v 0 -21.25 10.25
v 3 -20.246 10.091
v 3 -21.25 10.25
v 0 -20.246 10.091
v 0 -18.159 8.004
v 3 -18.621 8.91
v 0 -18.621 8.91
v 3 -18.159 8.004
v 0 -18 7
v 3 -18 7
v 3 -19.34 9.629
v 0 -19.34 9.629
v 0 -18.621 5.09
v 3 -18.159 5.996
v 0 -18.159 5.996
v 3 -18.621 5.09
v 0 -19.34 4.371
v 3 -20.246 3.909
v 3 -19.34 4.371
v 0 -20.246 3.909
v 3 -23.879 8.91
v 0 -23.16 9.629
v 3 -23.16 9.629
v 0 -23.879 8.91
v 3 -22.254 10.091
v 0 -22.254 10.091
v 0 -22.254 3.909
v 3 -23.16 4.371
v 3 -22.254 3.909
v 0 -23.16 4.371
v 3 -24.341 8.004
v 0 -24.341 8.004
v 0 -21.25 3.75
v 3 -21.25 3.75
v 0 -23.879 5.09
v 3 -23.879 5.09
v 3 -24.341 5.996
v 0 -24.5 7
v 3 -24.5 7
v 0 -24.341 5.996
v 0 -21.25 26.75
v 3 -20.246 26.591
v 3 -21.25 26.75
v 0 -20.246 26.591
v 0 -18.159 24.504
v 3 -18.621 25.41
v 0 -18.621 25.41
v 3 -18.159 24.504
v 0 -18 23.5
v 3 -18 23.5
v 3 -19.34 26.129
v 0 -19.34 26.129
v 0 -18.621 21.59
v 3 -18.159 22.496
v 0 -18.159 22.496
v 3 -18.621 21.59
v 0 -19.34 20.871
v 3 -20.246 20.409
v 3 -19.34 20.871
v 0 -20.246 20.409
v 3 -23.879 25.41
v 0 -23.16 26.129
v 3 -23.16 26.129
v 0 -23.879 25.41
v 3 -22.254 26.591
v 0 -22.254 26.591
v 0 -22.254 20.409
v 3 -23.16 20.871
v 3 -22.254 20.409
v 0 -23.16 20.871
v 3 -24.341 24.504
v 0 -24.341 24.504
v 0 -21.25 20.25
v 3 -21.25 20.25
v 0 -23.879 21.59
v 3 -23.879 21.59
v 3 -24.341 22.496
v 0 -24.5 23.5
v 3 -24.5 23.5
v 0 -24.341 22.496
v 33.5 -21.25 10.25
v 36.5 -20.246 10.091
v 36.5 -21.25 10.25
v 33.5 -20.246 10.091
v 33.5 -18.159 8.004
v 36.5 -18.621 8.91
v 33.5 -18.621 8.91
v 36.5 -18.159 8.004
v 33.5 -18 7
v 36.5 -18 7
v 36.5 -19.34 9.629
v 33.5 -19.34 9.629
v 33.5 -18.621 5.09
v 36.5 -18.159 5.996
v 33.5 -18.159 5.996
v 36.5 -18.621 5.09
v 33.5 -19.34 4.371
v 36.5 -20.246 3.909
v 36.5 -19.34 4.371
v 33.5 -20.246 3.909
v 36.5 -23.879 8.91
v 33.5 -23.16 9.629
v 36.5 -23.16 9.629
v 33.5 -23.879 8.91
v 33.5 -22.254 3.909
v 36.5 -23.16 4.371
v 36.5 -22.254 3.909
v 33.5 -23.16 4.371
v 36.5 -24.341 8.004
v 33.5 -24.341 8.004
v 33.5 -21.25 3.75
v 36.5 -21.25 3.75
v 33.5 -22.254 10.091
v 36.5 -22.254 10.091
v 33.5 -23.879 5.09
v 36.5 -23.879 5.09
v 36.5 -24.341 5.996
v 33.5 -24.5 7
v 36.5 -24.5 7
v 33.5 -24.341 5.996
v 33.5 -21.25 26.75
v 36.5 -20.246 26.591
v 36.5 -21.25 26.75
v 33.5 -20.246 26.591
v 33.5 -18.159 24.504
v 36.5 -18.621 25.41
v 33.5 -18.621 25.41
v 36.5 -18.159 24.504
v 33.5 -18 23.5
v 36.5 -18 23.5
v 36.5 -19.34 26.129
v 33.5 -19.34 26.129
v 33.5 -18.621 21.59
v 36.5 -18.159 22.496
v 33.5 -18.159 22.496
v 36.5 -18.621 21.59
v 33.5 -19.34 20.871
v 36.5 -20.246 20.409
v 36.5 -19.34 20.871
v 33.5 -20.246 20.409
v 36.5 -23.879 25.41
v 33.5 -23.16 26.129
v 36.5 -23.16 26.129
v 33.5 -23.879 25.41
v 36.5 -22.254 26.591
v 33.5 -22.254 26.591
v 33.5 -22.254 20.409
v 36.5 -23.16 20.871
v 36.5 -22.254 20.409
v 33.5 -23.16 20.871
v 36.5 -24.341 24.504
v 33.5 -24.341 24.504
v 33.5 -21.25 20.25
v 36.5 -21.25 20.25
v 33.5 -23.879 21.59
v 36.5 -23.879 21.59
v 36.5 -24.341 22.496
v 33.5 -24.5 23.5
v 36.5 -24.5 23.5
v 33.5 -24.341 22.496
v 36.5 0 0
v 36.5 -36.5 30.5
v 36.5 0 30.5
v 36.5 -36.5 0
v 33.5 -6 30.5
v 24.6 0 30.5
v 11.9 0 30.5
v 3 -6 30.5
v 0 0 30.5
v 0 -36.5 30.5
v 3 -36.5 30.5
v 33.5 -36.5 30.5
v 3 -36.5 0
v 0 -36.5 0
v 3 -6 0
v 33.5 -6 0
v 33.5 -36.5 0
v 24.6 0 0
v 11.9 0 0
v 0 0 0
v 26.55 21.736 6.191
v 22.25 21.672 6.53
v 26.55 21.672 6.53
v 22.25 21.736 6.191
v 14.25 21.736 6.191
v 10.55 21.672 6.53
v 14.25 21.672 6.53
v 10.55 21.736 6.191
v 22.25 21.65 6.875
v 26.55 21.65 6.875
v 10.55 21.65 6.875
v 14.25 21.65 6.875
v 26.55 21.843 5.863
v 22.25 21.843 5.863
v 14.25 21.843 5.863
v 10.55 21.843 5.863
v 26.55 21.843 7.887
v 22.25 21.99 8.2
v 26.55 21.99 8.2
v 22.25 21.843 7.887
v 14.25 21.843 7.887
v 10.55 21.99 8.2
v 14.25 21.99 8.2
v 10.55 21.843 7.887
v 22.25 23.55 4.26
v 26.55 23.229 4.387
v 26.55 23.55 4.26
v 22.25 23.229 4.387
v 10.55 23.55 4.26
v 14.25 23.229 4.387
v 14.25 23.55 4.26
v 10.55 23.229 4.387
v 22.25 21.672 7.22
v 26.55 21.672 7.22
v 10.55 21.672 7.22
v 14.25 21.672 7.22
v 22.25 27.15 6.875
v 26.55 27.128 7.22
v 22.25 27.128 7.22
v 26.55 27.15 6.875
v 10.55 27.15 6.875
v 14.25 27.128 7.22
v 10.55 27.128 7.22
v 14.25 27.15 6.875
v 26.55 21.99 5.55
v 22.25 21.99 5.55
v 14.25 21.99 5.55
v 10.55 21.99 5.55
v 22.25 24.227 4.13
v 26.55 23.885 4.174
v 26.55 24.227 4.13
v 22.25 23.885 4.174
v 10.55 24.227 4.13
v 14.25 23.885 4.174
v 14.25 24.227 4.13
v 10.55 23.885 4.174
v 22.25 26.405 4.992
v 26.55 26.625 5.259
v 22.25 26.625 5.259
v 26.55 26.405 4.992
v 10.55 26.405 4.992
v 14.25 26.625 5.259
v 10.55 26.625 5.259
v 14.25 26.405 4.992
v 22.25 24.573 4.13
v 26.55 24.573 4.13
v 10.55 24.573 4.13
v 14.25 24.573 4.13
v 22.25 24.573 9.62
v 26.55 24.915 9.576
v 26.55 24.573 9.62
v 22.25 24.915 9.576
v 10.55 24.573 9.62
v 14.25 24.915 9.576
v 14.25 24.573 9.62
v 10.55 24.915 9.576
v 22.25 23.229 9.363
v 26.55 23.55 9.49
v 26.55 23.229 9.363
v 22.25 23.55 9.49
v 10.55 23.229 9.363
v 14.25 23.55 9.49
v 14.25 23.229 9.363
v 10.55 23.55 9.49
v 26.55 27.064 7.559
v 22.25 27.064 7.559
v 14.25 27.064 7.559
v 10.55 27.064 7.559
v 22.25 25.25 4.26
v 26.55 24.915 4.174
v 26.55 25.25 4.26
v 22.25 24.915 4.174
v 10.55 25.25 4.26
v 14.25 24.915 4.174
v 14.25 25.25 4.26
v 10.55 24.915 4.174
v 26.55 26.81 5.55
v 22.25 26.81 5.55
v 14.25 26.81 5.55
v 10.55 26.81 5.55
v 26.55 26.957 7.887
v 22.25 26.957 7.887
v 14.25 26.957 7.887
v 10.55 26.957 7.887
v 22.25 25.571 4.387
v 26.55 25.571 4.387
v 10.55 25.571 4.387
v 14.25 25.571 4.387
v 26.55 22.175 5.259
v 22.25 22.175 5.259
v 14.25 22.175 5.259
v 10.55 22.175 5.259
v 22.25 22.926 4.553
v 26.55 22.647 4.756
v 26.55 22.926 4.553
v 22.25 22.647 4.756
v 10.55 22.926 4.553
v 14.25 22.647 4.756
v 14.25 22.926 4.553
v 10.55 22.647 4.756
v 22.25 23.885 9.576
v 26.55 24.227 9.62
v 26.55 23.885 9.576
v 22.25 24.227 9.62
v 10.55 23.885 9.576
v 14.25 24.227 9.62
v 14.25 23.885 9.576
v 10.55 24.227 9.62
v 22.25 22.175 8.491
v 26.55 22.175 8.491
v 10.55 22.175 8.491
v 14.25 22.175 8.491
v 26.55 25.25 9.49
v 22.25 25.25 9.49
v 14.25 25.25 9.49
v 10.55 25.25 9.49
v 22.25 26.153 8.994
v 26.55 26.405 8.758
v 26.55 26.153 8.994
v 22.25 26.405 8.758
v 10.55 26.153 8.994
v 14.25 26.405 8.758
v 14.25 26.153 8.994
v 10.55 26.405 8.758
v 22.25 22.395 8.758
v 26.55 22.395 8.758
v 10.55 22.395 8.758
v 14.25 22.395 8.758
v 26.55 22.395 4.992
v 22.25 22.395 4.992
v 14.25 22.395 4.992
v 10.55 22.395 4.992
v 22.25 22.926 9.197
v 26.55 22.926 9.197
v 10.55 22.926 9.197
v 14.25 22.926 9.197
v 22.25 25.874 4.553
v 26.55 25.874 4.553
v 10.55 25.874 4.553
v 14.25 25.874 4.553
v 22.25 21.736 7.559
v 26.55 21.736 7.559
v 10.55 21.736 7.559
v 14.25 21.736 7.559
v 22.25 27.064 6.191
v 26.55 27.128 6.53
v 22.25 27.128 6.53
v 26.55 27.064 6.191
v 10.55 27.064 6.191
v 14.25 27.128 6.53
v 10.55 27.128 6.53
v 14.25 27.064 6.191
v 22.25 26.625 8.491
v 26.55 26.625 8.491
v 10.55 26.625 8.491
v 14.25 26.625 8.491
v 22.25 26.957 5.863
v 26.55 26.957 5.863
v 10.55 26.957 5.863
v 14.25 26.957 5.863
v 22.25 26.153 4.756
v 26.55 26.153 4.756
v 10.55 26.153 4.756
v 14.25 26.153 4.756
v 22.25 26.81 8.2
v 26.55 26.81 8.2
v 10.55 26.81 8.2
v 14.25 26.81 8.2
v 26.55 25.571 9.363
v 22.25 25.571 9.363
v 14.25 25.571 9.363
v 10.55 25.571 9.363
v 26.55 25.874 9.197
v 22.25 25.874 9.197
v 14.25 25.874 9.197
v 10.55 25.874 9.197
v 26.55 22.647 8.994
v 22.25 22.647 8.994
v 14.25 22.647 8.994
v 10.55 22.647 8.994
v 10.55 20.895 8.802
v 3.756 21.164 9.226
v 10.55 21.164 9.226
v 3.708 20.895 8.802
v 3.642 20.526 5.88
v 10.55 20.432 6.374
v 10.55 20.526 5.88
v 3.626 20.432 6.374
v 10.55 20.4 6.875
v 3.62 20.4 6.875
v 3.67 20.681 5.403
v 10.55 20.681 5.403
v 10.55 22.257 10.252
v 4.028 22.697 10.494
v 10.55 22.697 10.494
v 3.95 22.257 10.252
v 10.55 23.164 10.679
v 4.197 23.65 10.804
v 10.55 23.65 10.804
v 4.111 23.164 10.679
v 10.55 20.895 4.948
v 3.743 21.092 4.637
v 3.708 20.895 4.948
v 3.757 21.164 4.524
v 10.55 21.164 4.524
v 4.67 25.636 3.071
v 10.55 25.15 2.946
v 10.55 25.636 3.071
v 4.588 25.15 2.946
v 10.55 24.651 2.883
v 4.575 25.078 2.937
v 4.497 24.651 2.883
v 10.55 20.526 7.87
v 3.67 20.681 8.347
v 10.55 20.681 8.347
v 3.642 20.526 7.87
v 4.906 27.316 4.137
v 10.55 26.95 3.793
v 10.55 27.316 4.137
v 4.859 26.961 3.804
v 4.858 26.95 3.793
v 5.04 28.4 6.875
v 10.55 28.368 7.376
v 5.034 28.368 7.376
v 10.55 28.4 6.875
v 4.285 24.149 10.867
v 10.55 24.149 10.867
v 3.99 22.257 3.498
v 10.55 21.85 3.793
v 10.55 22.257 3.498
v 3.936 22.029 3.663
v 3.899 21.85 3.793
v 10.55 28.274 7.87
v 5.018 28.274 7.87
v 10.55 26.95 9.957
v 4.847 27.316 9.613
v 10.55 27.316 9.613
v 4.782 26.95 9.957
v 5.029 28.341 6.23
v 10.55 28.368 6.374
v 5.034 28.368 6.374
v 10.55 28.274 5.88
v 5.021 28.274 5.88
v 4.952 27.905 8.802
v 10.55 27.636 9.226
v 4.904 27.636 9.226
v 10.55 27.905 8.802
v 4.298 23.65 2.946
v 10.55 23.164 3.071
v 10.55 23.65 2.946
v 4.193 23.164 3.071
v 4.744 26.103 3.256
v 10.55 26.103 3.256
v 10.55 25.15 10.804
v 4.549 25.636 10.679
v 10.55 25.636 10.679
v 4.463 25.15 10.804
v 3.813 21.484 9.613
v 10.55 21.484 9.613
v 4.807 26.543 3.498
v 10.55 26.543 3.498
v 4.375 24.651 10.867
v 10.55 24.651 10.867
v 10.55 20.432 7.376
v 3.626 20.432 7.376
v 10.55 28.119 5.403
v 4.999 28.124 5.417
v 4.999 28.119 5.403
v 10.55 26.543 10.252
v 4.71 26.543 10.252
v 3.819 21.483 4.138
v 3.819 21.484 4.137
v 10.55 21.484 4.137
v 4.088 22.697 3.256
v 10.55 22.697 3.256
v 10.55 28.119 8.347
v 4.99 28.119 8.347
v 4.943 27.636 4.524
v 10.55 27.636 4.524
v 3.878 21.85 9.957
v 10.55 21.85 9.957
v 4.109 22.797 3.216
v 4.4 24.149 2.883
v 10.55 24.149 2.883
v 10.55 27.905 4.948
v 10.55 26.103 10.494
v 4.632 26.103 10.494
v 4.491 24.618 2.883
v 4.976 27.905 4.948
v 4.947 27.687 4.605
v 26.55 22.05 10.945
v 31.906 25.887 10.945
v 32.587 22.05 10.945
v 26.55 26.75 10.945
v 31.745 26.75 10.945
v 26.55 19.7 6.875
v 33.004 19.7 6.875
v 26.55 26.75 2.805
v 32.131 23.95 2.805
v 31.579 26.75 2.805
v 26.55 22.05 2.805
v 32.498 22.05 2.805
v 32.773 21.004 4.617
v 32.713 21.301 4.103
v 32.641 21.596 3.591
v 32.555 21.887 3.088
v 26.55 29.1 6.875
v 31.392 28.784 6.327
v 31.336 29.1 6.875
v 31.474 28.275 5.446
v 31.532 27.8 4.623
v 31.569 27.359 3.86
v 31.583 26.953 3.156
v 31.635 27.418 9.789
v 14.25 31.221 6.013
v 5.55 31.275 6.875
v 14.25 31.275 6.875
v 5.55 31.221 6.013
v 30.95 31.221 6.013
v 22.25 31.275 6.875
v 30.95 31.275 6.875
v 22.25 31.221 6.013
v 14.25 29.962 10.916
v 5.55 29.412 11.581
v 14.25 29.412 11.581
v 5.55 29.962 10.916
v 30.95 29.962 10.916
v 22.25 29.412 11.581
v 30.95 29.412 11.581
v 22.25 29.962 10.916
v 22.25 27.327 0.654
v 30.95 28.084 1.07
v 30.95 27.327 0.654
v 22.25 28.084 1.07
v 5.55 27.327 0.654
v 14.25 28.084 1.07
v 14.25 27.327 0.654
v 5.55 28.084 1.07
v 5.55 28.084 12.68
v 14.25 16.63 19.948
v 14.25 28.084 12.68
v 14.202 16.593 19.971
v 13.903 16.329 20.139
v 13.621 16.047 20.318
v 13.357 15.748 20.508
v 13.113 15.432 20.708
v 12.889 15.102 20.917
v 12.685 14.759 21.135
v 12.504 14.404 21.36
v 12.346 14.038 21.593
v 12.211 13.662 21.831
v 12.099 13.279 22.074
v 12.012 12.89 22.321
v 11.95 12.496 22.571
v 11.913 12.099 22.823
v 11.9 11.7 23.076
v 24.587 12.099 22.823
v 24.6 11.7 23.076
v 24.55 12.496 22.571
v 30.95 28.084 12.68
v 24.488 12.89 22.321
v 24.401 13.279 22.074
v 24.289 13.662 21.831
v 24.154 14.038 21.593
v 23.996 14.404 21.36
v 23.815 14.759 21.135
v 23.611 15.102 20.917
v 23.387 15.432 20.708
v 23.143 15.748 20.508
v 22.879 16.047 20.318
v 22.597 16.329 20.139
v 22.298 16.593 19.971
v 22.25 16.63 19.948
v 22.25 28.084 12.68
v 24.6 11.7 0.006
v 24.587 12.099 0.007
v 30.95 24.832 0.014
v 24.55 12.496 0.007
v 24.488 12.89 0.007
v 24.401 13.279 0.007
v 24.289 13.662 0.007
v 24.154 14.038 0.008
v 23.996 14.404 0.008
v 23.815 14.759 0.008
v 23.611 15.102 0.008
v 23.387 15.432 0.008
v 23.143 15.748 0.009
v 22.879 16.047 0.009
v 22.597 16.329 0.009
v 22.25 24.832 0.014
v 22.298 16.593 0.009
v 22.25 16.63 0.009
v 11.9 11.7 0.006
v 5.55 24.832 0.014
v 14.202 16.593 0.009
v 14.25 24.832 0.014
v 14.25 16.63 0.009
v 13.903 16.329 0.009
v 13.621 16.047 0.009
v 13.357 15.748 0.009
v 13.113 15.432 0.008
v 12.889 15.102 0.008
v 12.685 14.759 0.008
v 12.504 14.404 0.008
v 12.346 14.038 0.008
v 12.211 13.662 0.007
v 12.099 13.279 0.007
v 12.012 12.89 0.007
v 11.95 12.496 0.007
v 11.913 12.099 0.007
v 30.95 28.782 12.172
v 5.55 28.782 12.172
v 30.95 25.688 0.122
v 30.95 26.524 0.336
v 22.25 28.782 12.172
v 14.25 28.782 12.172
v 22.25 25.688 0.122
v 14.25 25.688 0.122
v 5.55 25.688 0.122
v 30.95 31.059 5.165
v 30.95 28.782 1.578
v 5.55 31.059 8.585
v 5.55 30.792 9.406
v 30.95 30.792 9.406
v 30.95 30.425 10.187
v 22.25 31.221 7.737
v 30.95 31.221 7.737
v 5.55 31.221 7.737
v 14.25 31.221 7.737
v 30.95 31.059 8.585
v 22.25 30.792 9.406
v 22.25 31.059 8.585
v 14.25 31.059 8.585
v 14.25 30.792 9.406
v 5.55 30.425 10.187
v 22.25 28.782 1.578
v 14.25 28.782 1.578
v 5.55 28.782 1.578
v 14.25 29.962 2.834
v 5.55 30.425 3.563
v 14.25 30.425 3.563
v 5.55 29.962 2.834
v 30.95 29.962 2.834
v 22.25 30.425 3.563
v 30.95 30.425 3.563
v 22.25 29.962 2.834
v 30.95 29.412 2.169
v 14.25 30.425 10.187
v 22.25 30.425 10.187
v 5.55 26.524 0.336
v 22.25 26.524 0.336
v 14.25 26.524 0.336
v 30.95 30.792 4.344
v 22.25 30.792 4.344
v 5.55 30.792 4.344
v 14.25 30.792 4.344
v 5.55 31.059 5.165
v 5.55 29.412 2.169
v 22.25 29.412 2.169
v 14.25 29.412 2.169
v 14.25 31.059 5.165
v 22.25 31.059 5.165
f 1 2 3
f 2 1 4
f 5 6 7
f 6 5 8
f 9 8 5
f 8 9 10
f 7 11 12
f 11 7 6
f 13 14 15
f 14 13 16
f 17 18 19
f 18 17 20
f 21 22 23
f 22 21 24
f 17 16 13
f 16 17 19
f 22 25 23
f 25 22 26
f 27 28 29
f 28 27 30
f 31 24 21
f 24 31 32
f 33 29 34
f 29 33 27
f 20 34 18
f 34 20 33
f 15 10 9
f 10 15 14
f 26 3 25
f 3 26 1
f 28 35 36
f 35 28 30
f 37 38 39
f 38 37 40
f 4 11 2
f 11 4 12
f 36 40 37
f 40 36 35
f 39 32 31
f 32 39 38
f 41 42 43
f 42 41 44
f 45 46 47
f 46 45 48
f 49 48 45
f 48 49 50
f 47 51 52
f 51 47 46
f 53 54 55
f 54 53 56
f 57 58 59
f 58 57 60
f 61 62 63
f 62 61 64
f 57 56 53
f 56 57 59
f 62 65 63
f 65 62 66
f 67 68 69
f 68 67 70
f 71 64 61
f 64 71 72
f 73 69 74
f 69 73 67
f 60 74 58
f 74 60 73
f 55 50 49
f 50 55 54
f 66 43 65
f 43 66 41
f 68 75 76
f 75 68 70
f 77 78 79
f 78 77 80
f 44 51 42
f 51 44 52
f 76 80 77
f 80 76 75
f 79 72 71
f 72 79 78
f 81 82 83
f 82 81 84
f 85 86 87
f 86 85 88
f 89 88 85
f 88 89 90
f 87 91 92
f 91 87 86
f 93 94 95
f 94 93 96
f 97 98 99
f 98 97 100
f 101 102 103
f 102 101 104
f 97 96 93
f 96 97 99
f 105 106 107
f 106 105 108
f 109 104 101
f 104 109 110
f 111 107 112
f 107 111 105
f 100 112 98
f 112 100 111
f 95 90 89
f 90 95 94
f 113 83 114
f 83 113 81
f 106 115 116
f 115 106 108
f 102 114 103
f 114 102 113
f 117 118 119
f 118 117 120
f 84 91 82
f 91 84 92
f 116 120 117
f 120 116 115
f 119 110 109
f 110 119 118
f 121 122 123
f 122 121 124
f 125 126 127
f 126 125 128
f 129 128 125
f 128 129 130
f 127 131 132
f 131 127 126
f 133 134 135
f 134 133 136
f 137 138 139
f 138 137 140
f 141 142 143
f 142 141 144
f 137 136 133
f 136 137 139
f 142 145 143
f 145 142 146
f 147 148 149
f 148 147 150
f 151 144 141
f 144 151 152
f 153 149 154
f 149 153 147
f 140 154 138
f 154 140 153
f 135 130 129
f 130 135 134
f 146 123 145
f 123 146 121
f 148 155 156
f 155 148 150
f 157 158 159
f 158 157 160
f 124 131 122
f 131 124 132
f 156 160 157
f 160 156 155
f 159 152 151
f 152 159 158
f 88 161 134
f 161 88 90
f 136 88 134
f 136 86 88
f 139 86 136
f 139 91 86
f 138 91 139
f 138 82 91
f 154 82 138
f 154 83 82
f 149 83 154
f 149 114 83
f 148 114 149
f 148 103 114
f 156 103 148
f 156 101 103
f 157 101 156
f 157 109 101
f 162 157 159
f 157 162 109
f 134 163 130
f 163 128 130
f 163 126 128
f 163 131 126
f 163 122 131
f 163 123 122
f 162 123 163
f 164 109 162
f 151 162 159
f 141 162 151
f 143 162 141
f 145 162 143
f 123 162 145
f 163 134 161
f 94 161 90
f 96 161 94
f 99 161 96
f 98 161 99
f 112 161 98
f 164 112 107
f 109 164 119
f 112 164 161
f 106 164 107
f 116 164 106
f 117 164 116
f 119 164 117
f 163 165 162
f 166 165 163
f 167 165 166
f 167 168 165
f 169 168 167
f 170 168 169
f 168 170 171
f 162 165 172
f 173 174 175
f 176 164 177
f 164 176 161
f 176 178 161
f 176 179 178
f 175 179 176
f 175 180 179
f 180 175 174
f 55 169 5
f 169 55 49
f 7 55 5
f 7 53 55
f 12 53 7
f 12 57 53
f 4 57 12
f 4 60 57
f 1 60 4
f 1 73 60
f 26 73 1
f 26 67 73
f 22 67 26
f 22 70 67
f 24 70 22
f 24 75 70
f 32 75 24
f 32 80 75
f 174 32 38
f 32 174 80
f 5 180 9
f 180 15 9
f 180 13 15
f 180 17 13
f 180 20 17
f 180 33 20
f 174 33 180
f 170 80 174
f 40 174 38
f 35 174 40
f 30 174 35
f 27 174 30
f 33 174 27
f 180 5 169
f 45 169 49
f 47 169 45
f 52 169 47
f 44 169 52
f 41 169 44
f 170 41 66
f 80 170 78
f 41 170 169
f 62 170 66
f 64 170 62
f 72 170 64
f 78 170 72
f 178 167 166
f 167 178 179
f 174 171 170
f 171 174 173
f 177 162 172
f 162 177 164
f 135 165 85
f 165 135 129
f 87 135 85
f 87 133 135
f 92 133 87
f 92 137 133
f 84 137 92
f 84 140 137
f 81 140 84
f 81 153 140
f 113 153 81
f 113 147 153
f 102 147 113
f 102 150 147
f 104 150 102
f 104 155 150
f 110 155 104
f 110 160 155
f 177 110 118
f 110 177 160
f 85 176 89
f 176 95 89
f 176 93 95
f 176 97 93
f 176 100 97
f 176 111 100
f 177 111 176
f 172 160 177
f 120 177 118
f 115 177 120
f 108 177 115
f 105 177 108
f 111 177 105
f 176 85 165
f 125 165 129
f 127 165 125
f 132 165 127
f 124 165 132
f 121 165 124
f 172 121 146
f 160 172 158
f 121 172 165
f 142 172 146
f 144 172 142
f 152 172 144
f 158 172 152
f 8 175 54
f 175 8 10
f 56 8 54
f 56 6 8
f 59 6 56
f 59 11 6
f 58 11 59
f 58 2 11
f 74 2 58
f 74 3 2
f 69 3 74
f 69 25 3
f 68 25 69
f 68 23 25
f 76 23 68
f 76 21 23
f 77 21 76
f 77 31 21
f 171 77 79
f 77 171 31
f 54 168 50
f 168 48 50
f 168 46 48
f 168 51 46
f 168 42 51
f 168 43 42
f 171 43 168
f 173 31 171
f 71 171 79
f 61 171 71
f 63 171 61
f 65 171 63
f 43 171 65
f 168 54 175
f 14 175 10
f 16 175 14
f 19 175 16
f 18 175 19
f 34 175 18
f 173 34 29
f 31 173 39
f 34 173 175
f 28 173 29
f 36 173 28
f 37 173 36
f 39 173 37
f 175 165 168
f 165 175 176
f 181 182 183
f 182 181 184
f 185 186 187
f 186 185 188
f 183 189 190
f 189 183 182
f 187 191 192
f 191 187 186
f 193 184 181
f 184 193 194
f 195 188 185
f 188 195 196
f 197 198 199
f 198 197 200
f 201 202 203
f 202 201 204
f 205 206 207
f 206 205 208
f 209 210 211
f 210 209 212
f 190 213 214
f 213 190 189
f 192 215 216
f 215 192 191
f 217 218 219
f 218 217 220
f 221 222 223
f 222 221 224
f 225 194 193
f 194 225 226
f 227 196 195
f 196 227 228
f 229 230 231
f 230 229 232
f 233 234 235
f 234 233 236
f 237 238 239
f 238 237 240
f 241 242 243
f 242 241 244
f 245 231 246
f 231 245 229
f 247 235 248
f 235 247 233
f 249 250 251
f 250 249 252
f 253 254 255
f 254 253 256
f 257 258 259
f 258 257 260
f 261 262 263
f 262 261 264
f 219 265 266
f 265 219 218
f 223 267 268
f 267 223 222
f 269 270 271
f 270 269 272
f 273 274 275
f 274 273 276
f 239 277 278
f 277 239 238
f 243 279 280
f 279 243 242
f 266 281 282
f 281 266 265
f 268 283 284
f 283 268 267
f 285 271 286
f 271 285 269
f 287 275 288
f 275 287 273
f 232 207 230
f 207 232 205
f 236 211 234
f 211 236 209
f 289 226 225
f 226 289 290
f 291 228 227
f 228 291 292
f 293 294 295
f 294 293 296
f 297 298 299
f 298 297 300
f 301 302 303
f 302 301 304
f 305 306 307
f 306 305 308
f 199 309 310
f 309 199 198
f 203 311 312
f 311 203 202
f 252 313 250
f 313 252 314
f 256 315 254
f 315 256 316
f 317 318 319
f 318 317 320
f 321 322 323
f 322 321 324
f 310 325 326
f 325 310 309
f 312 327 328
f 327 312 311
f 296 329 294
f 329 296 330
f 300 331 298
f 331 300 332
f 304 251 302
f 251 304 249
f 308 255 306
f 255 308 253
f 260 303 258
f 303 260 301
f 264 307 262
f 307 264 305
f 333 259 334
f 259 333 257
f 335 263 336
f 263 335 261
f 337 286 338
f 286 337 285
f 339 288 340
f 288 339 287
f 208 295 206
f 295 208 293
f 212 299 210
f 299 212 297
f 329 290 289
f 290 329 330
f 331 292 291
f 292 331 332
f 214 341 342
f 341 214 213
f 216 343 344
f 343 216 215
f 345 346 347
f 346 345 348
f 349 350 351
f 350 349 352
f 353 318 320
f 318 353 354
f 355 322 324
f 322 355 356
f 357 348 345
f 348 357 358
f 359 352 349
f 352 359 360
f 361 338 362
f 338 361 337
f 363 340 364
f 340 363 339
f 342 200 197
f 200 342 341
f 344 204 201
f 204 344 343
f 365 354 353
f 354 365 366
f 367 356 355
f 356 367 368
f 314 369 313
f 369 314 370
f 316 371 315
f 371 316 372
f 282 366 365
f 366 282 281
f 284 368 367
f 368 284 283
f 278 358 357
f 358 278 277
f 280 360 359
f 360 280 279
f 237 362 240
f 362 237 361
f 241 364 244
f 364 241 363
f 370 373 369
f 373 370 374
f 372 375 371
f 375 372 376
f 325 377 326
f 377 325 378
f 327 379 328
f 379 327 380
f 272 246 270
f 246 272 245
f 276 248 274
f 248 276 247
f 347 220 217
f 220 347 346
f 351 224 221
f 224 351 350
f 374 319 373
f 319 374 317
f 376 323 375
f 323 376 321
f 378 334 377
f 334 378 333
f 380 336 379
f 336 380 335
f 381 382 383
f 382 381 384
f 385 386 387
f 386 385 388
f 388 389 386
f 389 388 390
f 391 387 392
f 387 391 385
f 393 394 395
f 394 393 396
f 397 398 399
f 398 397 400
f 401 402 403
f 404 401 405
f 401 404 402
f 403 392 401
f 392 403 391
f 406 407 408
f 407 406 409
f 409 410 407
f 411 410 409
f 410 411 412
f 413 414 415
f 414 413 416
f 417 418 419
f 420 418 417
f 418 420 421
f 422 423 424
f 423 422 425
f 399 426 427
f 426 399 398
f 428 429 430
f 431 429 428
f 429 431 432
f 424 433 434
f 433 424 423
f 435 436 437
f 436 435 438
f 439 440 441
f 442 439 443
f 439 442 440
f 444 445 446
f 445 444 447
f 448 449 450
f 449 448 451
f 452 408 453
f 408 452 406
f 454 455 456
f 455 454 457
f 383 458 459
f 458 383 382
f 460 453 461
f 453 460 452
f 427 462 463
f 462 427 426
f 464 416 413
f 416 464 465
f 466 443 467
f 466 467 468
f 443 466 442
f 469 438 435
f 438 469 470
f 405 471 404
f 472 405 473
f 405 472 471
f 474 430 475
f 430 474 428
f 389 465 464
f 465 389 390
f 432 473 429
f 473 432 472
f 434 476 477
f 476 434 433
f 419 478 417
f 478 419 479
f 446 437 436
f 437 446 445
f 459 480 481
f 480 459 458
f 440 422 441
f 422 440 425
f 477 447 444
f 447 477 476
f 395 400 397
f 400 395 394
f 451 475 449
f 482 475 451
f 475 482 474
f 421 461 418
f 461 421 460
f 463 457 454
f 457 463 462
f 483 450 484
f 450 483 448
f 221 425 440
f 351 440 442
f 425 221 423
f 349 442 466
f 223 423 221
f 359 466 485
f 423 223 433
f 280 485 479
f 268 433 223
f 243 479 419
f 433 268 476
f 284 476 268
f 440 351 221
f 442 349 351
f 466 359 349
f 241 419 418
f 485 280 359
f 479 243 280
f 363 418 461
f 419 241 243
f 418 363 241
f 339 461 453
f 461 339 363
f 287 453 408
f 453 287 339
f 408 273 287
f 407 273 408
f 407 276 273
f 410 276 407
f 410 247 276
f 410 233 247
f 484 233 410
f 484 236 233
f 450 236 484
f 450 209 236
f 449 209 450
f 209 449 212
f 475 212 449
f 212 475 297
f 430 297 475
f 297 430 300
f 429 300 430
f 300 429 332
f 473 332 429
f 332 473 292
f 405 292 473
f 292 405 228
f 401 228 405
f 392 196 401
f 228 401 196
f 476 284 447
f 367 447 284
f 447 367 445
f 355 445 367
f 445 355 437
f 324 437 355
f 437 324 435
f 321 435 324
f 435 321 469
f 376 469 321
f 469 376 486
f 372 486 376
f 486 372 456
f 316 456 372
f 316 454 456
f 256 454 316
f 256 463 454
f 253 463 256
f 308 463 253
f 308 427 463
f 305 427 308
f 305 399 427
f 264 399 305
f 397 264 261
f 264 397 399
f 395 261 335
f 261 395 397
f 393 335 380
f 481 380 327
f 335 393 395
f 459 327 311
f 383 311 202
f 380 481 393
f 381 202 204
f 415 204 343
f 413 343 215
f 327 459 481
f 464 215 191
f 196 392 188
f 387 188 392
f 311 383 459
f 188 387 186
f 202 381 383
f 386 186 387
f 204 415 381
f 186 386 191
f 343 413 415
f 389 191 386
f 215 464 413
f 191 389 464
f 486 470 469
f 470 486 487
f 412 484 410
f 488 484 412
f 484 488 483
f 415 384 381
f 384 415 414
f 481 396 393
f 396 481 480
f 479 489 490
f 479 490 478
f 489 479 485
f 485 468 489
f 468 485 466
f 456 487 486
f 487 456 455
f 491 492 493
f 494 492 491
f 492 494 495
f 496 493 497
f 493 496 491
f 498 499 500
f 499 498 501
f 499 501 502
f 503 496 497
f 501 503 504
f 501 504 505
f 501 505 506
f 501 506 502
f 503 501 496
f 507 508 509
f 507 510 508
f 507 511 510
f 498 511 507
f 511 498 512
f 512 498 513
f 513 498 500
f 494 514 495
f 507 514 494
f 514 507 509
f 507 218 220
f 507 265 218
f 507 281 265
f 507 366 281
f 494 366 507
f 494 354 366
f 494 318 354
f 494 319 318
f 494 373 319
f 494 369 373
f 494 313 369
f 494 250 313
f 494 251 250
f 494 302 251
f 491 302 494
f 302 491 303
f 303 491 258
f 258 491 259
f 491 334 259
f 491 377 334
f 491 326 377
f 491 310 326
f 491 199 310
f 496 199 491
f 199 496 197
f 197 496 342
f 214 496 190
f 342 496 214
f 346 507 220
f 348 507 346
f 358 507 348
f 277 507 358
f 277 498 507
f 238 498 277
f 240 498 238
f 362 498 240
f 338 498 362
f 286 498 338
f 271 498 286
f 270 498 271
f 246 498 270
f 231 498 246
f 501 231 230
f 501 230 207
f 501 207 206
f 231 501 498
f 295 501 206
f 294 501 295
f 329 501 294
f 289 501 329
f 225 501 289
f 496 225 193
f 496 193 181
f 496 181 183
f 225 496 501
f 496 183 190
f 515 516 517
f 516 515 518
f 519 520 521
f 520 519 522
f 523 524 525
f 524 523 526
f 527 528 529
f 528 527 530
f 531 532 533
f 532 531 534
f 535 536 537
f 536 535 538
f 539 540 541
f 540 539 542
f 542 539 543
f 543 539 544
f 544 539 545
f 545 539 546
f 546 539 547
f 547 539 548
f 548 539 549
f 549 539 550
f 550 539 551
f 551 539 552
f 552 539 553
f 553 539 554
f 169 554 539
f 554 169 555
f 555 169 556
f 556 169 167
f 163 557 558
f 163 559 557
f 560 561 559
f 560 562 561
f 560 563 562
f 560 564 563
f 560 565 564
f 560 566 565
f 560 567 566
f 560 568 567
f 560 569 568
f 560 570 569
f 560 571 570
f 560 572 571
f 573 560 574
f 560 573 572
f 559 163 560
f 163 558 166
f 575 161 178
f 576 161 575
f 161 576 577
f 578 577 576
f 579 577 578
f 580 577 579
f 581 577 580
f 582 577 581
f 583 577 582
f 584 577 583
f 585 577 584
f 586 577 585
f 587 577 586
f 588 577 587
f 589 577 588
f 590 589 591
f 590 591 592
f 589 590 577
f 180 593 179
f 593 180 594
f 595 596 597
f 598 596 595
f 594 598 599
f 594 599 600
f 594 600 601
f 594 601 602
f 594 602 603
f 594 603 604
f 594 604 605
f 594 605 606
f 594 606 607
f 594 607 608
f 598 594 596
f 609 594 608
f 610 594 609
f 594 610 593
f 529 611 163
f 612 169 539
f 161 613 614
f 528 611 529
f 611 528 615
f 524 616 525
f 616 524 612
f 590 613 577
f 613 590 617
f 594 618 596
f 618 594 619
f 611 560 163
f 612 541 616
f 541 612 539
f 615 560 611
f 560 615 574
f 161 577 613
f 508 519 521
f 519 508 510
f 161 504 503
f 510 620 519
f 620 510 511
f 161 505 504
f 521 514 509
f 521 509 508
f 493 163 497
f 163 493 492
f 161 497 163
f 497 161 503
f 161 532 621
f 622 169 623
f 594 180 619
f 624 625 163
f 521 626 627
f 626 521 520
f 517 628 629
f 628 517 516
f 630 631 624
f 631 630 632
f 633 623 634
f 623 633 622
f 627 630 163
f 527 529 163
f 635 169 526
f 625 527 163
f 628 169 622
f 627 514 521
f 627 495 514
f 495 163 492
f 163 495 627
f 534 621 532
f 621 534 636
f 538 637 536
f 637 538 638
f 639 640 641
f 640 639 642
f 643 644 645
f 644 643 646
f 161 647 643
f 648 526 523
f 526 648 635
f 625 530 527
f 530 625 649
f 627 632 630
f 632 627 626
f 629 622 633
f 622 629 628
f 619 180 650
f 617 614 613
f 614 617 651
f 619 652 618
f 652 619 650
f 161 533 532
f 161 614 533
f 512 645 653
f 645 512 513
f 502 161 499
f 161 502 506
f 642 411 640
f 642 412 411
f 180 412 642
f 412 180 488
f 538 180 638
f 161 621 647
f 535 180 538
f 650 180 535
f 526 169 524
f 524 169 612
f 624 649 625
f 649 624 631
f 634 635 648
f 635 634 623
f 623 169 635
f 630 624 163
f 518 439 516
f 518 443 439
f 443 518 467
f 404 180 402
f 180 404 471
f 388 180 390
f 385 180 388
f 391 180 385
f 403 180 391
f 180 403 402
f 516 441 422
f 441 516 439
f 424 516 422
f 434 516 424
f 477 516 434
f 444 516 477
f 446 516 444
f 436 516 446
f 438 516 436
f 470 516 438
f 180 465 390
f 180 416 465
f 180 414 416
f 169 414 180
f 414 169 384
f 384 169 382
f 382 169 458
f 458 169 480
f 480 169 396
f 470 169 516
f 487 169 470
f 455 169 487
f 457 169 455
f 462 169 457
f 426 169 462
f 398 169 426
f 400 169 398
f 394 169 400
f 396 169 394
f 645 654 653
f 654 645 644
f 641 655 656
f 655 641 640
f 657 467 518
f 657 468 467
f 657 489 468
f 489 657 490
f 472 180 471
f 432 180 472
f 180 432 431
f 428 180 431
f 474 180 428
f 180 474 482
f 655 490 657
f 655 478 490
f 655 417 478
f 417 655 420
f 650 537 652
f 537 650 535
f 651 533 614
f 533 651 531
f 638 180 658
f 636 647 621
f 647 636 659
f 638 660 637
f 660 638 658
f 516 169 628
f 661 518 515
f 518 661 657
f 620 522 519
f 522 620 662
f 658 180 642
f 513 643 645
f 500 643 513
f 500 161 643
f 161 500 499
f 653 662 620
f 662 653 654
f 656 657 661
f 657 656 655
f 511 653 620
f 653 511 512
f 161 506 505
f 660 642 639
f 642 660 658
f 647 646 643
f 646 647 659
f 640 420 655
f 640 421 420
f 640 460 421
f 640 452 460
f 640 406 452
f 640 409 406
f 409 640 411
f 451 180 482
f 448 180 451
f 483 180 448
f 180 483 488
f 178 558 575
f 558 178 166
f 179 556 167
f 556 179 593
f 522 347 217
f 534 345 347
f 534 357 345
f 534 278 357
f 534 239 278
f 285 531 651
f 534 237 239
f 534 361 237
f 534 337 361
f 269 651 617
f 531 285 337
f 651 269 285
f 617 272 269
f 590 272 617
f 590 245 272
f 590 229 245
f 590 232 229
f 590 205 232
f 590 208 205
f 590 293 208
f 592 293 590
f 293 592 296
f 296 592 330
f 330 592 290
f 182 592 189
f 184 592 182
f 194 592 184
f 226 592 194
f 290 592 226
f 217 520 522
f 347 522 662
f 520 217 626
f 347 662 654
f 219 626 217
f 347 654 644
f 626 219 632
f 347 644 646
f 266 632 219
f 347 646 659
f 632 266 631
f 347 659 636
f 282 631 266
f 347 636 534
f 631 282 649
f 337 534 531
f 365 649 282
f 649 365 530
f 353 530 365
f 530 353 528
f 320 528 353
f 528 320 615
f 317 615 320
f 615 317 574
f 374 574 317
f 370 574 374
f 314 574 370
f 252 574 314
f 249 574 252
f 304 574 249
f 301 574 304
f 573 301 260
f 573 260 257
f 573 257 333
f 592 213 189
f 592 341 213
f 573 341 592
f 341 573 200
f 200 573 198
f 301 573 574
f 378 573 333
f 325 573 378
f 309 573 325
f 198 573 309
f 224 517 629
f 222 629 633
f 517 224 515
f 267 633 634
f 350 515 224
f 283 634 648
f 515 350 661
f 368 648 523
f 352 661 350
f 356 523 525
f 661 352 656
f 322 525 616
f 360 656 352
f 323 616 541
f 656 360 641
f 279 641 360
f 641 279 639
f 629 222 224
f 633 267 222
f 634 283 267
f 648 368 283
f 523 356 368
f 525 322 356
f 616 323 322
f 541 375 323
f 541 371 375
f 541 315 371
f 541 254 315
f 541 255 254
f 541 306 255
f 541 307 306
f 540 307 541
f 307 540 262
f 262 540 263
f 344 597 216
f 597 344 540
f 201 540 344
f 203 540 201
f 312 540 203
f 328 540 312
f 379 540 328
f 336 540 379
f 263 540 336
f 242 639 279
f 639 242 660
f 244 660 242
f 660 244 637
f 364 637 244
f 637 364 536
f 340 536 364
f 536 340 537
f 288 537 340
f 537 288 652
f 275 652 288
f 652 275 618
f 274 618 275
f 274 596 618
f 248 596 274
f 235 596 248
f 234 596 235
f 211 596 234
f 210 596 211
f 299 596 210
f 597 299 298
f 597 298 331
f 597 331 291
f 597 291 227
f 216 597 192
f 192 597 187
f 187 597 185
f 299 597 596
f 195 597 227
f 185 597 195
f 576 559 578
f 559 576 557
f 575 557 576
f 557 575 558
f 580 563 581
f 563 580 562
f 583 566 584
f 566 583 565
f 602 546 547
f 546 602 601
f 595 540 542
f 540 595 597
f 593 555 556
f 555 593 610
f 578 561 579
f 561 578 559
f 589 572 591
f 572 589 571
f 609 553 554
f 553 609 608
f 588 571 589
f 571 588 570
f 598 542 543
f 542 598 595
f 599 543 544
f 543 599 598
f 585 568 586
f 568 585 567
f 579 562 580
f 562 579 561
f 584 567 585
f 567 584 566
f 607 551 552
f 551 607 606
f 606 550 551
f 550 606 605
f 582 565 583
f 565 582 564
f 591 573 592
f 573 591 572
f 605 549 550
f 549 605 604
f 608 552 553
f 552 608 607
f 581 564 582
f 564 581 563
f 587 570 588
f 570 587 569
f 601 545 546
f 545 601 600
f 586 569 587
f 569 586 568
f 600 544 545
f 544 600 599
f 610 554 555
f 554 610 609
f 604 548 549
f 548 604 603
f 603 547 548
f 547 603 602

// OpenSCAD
// file: ../src/888_5002.scad
include <../parameters.scad>

module 888_5002() {
    joint_width = 8;
    
    difference() {
        hull() {
            translate([0, 0, -1])
                cube([strain_gauge_width*2, strain_gauge_screw_distance*1.75, 4], center=true);

            translate([0, 0, strain_gauge_width*2])
                rotate([0, 90, 0])
                    cylinder(d=M5_screw_diameter*2.5, h=strain_gauge_width*2, center=true, $fn=50);
        }

        translate([-strain_gauge_width-1, 0, strain_gauge_width*2])
        rotate([0, 90, 0])
        union() {
            cylinder(d=M5_screw_diameter, h=strain_gauge_width*2+2, $fn=50);
            cylinder(d=8, h=M5_head_height+1, $fn=50);
            
            translate([0, 0, strain_gauge_width*2+1-M5_nut_height+.1])
            cylinder(d=M5_nut_diameter, h=M5_nut_height, $fn=6);
        }

        translate([0, 0, strain_gauge_width/2])
            cube([strain_gauge_width, strain_gauge_width*2+1, strain_gauge_width], center=true);

        translate([0, 0, strain_gauge_width*3/2])
            cube([joint_width, strain_gauge_width*2, strain_gauge_width*3], center=true);

        translate([0, strain_gauge_screw_distance/2, 0])
            cylinder(d=M4_screw_diameter, h=10, center=true, $fn=20);

        translate([0, -strain_gauge_screw_distance/2, 0])
            cylinder(d=M4_screw_diameter, h=10, center=true, $fn=20);

        translate([0, 0, strain_gauge_width])
            rotate([90, 0, 0])
                cylinder(d=strain_gauge_width, h=strain_gauge_width*2, $fn=100, center=true);
    }
}

888_5002();
// file: ../src/lib/ALU_profile_holder_side.scad
include <../../parameters.scad>

module ALU_profile_holder_side(height) {
    wall_thickness = ALU_profile_holder_wall_thickness;
    
    //díry na přišroubování k Al profilům
    module screws_holes(diameter) {
        translate([0, 0, 7])
            rotate([90, 0, 90])
                cylinder(d=diameter, h=wall_thickness*2, center=true, $fn=20);
        
        translate([0, 0, height-7])
            rotate([90, 0, 90])
                cylinder(d=diameter, h=wall_thickness*2, center=true, $fn=20);
    }
    
    difference() {
        cube([ALU_profile_width+wall_thickness*2, ALU_profile_width + wall_thickness*2, height]);

        translate([wall_thickness, -0.1, -0.1])
            cube([ALU_profile_width, ALU_profile_width + 0.1, height + 0.2]);
        
        translate([wall_thickness*0.5, ALU_profile_width/2, 0]) {
            screws_holes(M6_screw_diameter);
            translate([ALU_profile_width+wall_thickness, 0, 0]) {
                screws_holes(M6_screw_diameter);
            }
        }
    }
}

ALU_profile_holder_side(30);
// file: ../src/888_5003.scad
include <../parameters.scad>
use <./lib/ALU_profile_holder_side.scad>
use <./888_5002.scad>


module 888_5003_A() {
    union() {
        translate([0, -ALU_profile_width-ALU_profile_holder_wall_thickness*2, 0])
        ALU_profile_holder_side(ALU_profile_width);
        
        translate([ALU_profile_width/2+ALU_profile_holder_wall_thickness, -1, 0])
        rotate([-90, 0, 0])
        difference() {
            hull() {
                translate([0, -ALU_profile_width/2, -1])
                    cube([ALU_profile_width+ALU_profile_holder_wall_thickness*2, ALU_profile_width, 4], center=true);
        
                translate([0, -M5_screw_diameter*2.5/2, strain_gauge_width*2])
                    rotate([0, 90, 0])
                        cylinder(d=M5_screw_diameter*2.5, h=strain_gauge_width*2, center=true, $fn=50);
            }
        
        translate([-strain_gauge_width-10, -M5_screw_diameter*2.5/2, strain_gauge_width*2])
        rotate([0, 90, 0])
        union() {
            cylinder(d=M5_screw_diameter, h=strain_gauge_width*2+11, $fn=50);
            cylinder(d=8, h=M5_head_height+10, $fn=50);
            
            translate([0, 0, strain_gauge_width*2+10-M5_nut_height+.1])
            cylinder(d=M5_nut_diameter, h=20, $fn=6);
        }
    
        translate([0, 0, strain_gauge_width/2])
        cube([strain_gauge_width, ALU_profile_width*2+2, strain_gauge_width], center=true);
    
        translate([0, 0, strain_gauge_width*3/2])
        cube([8, ALU_profile_width*2+2, strain_gauge_width*3], center=true);
    
        translate([0, 0, strain_gauge_width])
        rotate([90, 0, 0])
        cylinder(d=strain_gauge_width, h=ALU_profile_width*2+2, $fn=100, center=true);
        }
    }
}

module 888_5003_B() {
    union() {
        translate([0, -ALU_profile_width-ALU_profile_holder_wall_thickness*2, 0])
        ALU_profile_holder_side(ALU_profile_width);
        
        translate([ALU_profile_holder_wall_thickness, -1, ALU_profile_width/2])
        rotate([-90, 90, 0])
        difference() {
            hull() {
                translate([0, -ALU_profile_width/2, -1])
                    cube([ALU_profile_width, ALU_profile_width+ALU_profile_holder_wall_thickness*2, 4], center=true);
        
                translate([(ALU_profile_width-strain_gauge_width*2)/2, -ALU_profile_width/2, strain_gauge_width*2])
                    rotate([0, 90, 0])
                        cylinder(d=M5_screw_diameter*2.5, h=strain_gauge_width*2, center=true, $fn=50);
            }
        
        translate([(ALU_profile_width-strain_gauge_width*2)/2-strain_gauge_width-10, -ALU_profile_width/2, strain_gauge_width*2])
        rotate([0, 90, 0])
        union() {
            cylinder(d=M5_screw_diameter, h=strain_gauge_width*2+11, $fn=50);
            cylinder(d=8, h=M5_head_height+10, $fn=50);
            
            translate([0, 0, strain_gauge_width*2+10-M5_nut_height+.1])
            cylinder(d=M5_nut_diameter, h=20, $fn=6);
        }
    
        translate([(ALU_profile_width-strain_gauge_width*2)/2, 0, strain_gauge_width/2])
        cube([strain_gauge_width, ALU_profile_width*3+2, strain_gauge_width], center=true);
    
        translate([(ALU_profile_width-strain_gauge_width*2)/2, 0, strain_gauge_width*3/2])
        cube([8, ALU_profile_width*3+2, strain_gauge_width*3], center=true);
    
        translate([(ALU_profile_width-strain_gauge_width*2)/2, 0, strain_gauge_width])
        rotate([90, 0, 0])
        cylinder(d=strain_gauge_width, h=ALU_profile_width*2+2, $fn=100, center=true);
        }
    }
}

888_5003_A();

translate([-50, 0, 0])
888_5003_B();
// file: ../parameters.scad
maximum_printable_size = 150;

layer_thickness = 0.3;
global_clearance = 0.5;


//Screw diameter and nut for M10 [mm]
M10_screw_diameter = 10.4;
M10_head_height = 10;
M10_head_diameter = 16+0.5;
M10_nut_height = 10.5;
M10_nut_diameter = 25.5;
M10_nut_pocket = 22.3;

//Screw diameter for M8 [mm]
M8_screw_diameter = 8.6;
M8_head_height = 8;
M8_head_diameter = 13.5;
M8_nut_height = 7.5;
M8_square_nut_thin_height = 4.5;
M8_nut_diameter = 14.4 + 0.5;
M8_nut_pocket = 13 + 0.5;
M8_washer_diameter = 16;
M8_washer_thickness = 1.5;


//Screw diameter and nut for M6 [mm]
M6_screw_diameter=6.5;
M6_head_diameter = 10+0.5;
M6_head_height = 6;
M6_nut_height = 4.9;
M6_nut_diameter = 11.8;
M6_nut_pocket = 10.4;
M6_square_nut_height = 3;
M6_square_nut_diameter = 10;
M6_washer_thickness = 1.6;

//Screw diameter and nut for M5 [mm]
M5_screw_diameter=5.5;
M5_head_height = 5;
M5_head_diameter = 13+0.5;
M5_nut_height = 4.5;
M5_nut_diameter = 9.4;
M5_nut_pocket = 8.4;

//Screw diameter and nut for M4 [mm]
M4_screw_diameter=4.5;
M4_screw_head_height = 4;
M4_nut_height = 3.2;
M4_nut_diameter = 8.4;
M4_nut_pocket = 7.5;

//Screw diameter and nut for M3 [mm]
M3_screw_diameter = 3.2;
M3_nut_height = 2.7;
M3_nut_diameter = 6.6;
M3_nut_pocket = 5.6;
M3_screw_head_height = 3;

//Screw diameter and nut for M2,5 [mm]
M2_5_screw_diameter = 2.7;
M2_5_nut_height = 2.3;
M2_5_nut_diameter = 6;
M2_5_nut_pocket = 5.5;

// kulove lozisko

bearing_efsm_08_h = 33+1;
bearing_efsm_08_m = 22;
bearing_efsm_08_db = 18;
bearing_efsm_08_ag = 10.5;
bearing_efsm_08_n = M4_screw_diameter;
bearing_efsm_08_a1 = 5.5;
bearing_efsm_08_d = 8.25;
bearing_efsm_08_B = 8; // ball height

bearing_efsm_10_h = 38+1;
bearing_efsm_10_m = 26;
bearing_efsm_10_db = 21.9;
bearing_efsm_10_ag = 12+0.2;
bearing_efsm_10_n = M5_screw_diameter;
bearing_efsm_10_a1 = 6.5;
bearing_efsm_10_d = 10.25;


bearing_efsm_12_width = 40+1;
bearing_efsm_12_h = bearing_efsm_12_width;
bearing_efsm_12_boltd = 28/2; // polovina vzdalenosti mezi srouby
bearing_efsm_12_m = bearing_efsm_12_boltd*2;
bearing_efsm_12_db = 25;
bearing_efsm_12_ag = 13;
bearing_efsm_12_a1 = 7;
bearing_efsm_12_n = M5_screw_diameter;
bearing_efsm_12_d = 12.15;
bearing_efsm_12_B = 10; // ball height
bearing_efsm_space = 1;

bearing_efsm_17_width = 54+1;
bearing_efsm_17_h = bearing_efsm_17_width;
bearing_efsm_17_boltd = 38/2; // polovina vzdalenosti mezi srouby
bearing_efsm_17_m = bearing_efsm_17_boltd*2;
bearing_efsm_17_db = 35;
bearing_efsm_17_ag = 18;
bearing_efsm_17_n = M6_screw_diameter;
bearing_efsm_17_a1 = 10;
bearing_efsm_17_B = 17; // ball height

//limcove lozisko
bearing_EFOM_10_L=26; //celkova sirka zakladny
bearing_EFOM_10_d1=10.3;//diametr otvoru real=10 mm
bearing_EFOM_10_dB=22;//diametr vystupku pro ulozeni lozika
bearing_EFOM_10_H=52;//celková delka zakladny
bearing_EFOM_10_J=36;// hole pitch
bearing_EFOM_10_A1=6.5;//vyska pouzdra
bearing_EFOM_10_Ag=12;//celkova vyska
bearing_EFOM_10_N1=5;//sirka otvoru pro sroub
bearing_EFOM_10_N2=8;//delka otvoru pro sroub
bearing_EFOM_10_m=36;//roztec der pro sroub
bearing_EFOM_10_h=9;//vyska lozika


608_bearing_outer_diameter = 22.3;
608_bearing_inner_diameter = 16;
608_bearing_thickness = 7.1;


// 20 KG servo parameters

servo_20kg_axis_offset = 9.375; // jak je osa mimo stredu
servo_20kg_body_x = 42;
servo_20kg_body_y = 21;
servo_20kg_body_z = 40;
servo_20kg_thread_x = 49/2;
servo_20kg_thread_y = 10/2;
servo_20kg_body_below = 10; // jak hluboko je tělo serva pod drzaky na srouby
servo_20kg_below = 25.8; // jak hluboko je páka serva pod drzaky na srouby

servo_20kg_bolt_d = 2.5+0.3;
servo_20kg_nut_d = 5+0.3;


//strain gauge
strain_gauge_width = 12.7;
strain_gauge_length = 75.1;
strain_gauge_screw_distance = 10;

//ALU profile
ALU_profile_width = 30.5;
ALU_profile_holder_wall_thickness = 3;
ALU_profile_groove_width = 8;

//pillow block bearing
//https://www.igus.eu/product/372
//Part no. KSTM-08
KSTM08_screws_distance = 33;         //m
KSTM08_screws_holes_diameter = 4.5;  //d2
KSTM08_flange_thickness = 6;         //h3
KSTM08_case_width = 9;               //C1
KSTM08_case_length = 47;             //a
KSTM08_ball_width = 12;              //B
KSTM08_ball_hole_diameter = 7.85;    //d1


//ložiska pro malý rotor
bearing_outer_diameter = 10.2;    // Rozměr B1 v nákresu s přídavkem na toleranci otvoru
bearing_thickness = 4;        // Rozměr B2 v nákresu
//bearing_shaft_length = 19.5;    // Rozměr B3 v nákresu, Originalni hodnota 19.5
bearing_shaft_length = 20;    // Rozměr B3 v nákresu


//parametry víčka s telemetrickou anténou
S01_sila_materialu=1.2;
S01_vyska_horni_zavit=10;
S01_hloubka_zavitu=4;
S01_prumer_vnitrni=50;
LO_spodni_prumer=17.2;
LO_vyska_bez_krytu=15;
S01_tolerance_zavit=1.5;
R01_vyska_prekryti_statoru=10;

g3_0_cone1 = 70;
g3_0_srcew_dist = 55;



// scale parameters
base_length = 500;
mid_base_width = 500;
mid_base_height = 200;
mid_base_length = 500;
mid_base_x_offset = 50;
base_mid_base_hinge_offset = 50;
tower_height = 185;
tower_angle = atan((mid_base_width/2-ALU_profile_width-10)/tower_height);
tower_arm_length = tower_height/cos(tower_angle);
tower_drag_z_offset = 22;
electro_box_length = 225;
electro_box_width = 165;
electro_box_height = 51.5;

// calibration device parameters
calibration_arm_x_offset = 140;
calibration_arm_y_offset = 50;
// main file
//@set_slicing_config(../slicing/default.ini)

include <../parameters.scad>
use <../src/888_5003.scad>

888_5003_A();
